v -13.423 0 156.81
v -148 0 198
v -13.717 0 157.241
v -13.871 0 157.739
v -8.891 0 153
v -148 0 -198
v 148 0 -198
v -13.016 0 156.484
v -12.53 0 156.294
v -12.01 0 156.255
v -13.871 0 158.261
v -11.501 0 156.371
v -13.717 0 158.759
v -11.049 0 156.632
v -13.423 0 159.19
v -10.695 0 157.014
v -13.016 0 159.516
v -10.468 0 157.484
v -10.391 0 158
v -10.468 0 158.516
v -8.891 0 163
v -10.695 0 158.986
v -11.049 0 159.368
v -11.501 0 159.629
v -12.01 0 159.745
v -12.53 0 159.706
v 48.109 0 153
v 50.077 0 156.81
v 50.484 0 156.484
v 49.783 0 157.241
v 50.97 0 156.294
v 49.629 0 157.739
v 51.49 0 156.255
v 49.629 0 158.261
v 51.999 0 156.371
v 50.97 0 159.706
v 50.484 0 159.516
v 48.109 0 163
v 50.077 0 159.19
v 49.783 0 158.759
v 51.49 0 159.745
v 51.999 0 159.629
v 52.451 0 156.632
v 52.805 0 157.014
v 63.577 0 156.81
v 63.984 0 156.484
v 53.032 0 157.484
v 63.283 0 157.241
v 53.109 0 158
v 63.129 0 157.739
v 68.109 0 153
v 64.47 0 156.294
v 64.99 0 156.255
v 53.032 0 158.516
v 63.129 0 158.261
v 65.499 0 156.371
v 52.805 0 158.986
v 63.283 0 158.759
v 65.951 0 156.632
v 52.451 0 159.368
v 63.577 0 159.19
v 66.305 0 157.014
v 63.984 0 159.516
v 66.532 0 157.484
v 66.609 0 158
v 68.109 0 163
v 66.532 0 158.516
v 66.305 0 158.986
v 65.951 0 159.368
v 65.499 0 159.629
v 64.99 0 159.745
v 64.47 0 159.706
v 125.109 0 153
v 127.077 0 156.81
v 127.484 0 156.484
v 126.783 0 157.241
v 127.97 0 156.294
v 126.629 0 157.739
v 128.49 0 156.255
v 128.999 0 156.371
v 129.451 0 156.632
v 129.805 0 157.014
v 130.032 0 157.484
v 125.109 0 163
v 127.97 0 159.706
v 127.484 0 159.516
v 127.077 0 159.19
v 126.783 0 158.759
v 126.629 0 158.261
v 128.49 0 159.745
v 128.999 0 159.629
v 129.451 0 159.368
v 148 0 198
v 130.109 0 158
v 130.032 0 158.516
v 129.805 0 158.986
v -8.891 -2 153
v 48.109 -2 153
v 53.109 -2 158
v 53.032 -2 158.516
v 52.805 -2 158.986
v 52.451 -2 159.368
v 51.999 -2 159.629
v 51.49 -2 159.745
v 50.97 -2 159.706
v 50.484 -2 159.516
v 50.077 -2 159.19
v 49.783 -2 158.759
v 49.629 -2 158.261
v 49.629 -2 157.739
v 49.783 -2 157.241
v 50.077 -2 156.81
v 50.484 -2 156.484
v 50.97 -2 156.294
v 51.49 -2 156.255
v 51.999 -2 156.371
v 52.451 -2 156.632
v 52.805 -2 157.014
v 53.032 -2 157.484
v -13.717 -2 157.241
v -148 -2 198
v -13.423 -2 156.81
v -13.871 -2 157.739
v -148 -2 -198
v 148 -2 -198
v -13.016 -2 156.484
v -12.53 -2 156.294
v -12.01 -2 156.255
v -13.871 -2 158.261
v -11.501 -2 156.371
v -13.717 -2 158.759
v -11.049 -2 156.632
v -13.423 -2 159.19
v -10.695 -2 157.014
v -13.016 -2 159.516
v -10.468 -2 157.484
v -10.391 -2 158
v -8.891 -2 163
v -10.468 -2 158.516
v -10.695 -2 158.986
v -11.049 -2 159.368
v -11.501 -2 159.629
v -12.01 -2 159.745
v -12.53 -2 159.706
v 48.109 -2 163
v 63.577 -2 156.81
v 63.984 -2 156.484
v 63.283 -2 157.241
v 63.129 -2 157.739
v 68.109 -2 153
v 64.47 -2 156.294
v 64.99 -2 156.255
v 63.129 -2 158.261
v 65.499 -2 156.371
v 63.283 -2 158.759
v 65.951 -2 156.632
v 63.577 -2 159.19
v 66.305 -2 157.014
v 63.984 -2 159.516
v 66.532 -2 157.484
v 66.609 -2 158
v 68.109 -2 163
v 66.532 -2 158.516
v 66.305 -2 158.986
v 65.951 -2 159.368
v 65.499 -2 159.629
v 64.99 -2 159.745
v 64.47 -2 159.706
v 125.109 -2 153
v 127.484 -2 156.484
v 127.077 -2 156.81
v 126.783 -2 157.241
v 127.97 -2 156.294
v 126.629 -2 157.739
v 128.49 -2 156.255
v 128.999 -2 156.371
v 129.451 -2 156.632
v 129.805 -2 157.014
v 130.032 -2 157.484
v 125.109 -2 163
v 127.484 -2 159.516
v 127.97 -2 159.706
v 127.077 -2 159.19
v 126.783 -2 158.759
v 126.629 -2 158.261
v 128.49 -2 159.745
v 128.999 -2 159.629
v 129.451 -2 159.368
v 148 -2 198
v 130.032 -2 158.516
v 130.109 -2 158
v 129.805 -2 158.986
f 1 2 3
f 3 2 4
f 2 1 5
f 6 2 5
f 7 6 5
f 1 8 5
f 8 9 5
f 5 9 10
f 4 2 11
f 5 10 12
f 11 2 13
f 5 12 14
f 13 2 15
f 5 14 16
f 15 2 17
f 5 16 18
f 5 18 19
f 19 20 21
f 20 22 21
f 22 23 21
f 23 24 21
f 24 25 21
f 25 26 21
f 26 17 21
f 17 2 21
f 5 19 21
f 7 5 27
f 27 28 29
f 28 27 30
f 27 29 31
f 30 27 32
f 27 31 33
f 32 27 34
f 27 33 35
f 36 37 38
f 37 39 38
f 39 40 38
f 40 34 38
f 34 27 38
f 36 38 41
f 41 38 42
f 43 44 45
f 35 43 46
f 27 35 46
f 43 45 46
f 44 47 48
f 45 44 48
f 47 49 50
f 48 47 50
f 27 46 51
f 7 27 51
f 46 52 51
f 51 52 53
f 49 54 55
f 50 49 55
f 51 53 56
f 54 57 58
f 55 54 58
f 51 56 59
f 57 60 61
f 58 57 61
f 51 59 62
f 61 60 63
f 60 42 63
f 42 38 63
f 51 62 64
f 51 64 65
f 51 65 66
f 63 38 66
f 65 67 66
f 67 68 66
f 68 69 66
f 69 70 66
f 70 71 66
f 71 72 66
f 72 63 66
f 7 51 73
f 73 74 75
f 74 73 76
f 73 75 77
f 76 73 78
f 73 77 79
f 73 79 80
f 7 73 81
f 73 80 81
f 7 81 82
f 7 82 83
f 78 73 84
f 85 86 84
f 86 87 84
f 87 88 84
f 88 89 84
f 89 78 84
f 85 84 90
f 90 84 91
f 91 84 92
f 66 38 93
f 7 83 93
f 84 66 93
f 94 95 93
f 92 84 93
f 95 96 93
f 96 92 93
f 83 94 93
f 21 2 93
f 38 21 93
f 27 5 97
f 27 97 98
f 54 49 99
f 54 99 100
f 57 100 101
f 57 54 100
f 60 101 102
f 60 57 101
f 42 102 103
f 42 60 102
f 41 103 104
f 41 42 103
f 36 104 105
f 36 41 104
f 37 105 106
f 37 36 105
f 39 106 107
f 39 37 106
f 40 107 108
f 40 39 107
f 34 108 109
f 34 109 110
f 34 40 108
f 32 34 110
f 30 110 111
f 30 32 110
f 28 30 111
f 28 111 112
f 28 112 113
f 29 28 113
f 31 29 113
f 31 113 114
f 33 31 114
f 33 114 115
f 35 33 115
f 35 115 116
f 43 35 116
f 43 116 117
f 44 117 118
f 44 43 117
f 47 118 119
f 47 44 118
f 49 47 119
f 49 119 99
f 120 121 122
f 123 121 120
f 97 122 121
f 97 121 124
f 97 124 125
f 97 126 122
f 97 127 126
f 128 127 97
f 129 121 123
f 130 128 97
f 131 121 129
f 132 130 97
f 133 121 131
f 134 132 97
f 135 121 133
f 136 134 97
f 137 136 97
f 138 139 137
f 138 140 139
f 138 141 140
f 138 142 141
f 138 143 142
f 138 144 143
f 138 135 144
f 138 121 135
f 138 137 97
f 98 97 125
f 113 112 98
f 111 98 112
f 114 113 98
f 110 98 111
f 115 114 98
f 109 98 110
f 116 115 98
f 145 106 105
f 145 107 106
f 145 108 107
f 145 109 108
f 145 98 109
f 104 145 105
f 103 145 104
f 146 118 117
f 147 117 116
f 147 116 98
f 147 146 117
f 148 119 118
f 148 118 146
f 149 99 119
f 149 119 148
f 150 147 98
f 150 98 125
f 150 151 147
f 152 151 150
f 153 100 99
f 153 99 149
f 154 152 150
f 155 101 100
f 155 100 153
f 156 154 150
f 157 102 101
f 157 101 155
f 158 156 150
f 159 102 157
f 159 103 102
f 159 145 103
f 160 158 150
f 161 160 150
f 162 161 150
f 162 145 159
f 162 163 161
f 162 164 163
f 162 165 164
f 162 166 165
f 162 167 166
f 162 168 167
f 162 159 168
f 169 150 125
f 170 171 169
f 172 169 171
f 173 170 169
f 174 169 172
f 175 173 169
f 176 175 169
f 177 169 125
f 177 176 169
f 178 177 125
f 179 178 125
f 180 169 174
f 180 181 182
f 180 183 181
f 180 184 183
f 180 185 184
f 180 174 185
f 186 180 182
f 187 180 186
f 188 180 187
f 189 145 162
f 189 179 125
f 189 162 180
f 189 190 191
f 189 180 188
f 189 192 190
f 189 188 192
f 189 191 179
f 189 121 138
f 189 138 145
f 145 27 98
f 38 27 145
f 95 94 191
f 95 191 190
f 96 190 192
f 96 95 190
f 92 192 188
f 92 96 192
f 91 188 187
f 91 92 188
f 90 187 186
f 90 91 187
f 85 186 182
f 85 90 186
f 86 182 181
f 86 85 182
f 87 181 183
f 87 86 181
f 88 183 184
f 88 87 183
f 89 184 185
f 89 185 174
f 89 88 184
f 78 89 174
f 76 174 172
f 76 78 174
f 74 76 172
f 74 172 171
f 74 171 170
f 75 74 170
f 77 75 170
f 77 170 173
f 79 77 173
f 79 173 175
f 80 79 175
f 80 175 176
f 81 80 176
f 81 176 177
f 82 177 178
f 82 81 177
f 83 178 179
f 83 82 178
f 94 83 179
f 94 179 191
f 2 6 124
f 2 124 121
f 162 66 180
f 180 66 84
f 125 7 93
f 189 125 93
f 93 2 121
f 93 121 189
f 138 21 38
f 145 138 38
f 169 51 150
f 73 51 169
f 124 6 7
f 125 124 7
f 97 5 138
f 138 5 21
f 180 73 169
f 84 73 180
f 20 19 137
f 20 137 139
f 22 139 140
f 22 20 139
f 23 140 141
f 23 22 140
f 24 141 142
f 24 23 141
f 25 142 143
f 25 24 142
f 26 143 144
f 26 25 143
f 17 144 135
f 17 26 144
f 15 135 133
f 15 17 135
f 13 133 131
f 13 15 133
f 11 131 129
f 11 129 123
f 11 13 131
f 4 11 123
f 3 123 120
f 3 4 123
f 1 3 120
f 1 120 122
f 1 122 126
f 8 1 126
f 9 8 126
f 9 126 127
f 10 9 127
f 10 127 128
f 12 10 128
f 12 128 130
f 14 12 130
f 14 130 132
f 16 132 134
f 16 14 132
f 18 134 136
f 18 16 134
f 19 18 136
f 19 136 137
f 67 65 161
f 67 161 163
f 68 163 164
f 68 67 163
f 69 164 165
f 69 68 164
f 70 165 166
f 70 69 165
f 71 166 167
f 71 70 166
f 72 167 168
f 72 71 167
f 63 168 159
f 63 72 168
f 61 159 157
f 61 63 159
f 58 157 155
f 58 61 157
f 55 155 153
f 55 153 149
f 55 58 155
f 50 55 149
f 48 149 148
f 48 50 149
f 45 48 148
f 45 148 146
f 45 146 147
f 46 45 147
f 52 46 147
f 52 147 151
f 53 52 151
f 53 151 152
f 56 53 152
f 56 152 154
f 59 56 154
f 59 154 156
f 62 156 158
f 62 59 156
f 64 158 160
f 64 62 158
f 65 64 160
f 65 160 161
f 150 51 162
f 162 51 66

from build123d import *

# Parameters (mm, degrees)
F0_W     = 296
F0_H     = 396
F0_R     = 1.75
F0_W_2   = 57
F0_H_2   = 10
F1_DEPTH = 2


with BuildPart() as f1:
    # F0 (on Front) → F1 (new body)
    with BuildSketch(Plane.XZ):
        Rectangle(F0_W, F0_H)
        with Locations((-12.140578, 158)):
            Circle(F0_R, mode=Mode.SUBTRACT)
        with Locations((19.609422, 158)):
            Rectangle(F0_W_2, F0_H_2, mode=Mode.SUBTRACT)
        with Locations((51.359422, 158)):
            Circle(F0_R, mode=Mode.SUBTRACT)
        with Locations((64.859422, 158)):
            Circle(F0_R, mode=Mode.SUBTRACT)
        with Locations((96.609422, 158)):
            Rectangle(F0_W_2, F0_H_2, mode=Mode.SUBTRACT)
        with Locations((128.359422, 158)):
            Circle(F0_R, mode=Mode.SUBTRACT)
    extrude(amount=F1_DEPTH)


solid = f1.part
